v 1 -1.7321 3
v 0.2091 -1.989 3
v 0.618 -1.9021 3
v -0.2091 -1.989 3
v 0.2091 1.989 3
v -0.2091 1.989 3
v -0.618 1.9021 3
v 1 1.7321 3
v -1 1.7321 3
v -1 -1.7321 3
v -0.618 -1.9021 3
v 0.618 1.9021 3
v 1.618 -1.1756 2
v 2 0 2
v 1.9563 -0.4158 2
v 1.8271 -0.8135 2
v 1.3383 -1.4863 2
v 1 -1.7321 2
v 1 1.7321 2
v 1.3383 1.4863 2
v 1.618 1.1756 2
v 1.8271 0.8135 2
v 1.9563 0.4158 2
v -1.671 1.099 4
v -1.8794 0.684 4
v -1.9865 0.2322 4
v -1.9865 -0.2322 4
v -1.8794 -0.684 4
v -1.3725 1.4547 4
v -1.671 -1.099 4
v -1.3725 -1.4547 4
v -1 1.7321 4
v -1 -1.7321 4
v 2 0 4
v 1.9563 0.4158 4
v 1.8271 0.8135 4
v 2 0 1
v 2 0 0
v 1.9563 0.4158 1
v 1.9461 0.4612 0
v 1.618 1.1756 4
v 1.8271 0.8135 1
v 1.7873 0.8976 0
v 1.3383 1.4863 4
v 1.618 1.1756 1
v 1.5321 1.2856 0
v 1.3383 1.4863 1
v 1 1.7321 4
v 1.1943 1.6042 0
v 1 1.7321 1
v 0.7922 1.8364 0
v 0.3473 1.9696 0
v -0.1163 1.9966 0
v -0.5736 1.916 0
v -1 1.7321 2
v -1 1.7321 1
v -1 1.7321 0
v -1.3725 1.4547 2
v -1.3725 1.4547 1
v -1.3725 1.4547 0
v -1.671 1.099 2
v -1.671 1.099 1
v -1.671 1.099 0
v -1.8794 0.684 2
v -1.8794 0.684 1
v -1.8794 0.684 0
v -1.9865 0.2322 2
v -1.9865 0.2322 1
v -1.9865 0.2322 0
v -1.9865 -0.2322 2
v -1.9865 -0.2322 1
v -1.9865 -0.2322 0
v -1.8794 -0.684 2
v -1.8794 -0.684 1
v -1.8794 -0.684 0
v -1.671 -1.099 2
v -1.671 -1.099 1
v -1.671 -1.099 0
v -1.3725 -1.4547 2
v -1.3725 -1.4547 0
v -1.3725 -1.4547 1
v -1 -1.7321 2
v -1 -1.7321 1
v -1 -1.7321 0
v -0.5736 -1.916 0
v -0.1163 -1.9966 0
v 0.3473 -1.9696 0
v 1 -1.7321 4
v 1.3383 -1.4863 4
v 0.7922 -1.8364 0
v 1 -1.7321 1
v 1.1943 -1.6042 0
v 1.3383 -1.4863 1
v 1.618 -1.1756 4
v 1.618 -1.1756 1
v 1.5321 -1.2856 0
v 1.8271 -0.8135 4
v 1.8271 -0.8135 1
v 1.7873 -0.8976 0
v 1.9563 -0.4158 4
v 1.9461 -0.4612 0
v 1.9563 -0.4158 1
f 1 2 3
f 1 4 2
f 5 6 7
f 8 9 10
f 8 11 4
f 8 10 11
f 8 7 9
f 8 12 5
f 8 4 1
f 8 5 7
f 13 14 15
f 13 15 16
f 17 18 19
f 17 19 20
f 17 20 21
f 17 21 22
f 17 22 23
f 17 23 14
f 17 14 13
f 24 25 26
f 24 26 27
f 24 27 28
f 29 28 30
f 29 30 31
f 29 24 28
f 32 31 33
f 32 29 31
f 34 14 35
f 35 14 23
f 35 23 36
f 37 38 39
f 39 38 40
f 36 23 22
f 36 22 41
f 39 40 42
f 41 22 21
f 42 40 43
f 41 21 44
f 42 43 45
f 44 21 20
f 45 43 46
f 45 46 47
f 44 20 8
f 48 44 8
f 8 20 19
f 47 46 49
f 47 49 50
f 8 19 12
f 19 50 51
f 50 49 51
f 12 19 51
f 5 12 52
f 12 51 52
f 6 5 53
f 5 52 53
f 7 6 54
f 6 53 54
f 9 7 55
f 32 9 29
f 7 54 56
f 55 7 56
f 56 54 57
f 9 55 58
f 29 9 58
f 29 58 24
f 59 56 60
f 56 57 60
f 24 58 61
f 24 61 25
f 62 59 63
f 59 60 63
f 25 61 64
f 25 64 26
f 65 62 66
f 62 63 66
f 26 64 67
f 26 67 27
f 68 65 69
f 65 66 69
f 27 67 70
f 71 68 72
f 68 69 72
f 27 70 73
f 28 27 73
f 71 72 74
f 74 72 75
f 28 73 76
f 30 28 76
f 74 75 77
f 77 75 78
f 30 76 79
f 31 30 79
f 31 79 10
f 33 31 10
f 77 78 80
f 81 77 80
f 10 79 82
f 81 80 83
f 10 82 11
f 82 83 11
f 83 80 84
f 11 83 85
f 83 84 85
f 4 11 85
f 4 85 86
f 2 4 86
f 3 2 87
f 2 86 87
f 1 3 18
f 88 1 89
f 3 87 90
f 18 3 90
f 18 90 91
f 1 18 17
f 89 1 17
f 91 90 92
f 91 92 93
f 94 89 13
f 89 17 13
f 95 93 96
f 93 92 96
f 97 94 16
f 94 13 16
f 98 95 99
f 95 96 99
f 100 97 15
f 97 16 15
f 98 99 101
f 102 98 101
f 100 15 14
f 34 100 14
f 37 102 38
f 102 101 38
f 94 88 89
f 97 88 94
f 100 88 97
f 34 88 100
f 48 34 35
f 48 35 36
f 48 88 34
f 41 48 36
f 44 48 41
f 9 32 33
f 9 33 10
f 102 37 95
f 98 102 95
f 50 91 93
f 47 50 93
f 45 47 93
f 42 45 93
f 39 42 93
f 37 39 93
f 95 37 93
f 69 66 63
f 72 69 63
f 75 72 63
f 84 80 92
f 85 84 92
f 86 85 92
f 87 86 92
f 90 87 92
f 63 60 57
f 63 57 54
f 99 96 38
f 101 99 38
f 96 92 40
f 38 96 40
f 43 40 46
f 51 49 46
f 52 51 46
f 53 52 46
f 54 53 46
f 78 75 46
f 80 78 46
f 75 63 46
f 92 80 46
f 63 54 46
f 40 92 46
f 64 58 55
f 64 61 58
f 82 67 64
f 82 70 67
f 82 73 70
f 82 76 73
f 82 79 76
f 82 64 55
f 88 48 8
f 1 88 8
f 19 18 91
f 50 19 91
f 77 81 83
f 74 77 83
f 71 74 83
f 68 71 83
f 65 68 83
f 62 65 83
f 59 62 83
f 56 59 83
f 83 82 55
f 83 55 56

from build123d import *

# Parameters (mm, degrees)
SKETCH1_R           = 2
BOSS_EXTRUDE1_DEPTH = 4
SKETCH2_W           = 1
SKETCH2_H           = 1
SKETCH2_W_2         = 2
CUT_EXTRUDE1_DEPTH  = 5


with BuildPart() as part:
    # Sketch1 → Boss-Extrude1 (new body)
    with BuildSketch(Plane.XY):
        Circle(SKETCH1_R)
    extrude(amount=BOSS_EXTRUDE1_DEPTH)

    # Sketch2 → Cut-Extrude1 (cut, symmetric)
    with BuildSketch(Plane(origin=(0, 0, 0), x_dir=(1, 0, 0), z_dir=(0, 1, 0))):
        with Locations((-1.5, -1.5)):
            Rectangle(SKETCH2_W, SKETCH2_H)
        with Locations((1.5, -1.5)):
            Rectangle(SKETCH2_W, SKETCH2_H)
        with Locations((0, -3.5)):
            Rectangle(SKETCH2_W_2, SKETCH2_H)
    extrude(amount=CUT_EXTRUDE1_DEPTH, both=True, mode=Mode.SUBTRACT)


solid = part.part
